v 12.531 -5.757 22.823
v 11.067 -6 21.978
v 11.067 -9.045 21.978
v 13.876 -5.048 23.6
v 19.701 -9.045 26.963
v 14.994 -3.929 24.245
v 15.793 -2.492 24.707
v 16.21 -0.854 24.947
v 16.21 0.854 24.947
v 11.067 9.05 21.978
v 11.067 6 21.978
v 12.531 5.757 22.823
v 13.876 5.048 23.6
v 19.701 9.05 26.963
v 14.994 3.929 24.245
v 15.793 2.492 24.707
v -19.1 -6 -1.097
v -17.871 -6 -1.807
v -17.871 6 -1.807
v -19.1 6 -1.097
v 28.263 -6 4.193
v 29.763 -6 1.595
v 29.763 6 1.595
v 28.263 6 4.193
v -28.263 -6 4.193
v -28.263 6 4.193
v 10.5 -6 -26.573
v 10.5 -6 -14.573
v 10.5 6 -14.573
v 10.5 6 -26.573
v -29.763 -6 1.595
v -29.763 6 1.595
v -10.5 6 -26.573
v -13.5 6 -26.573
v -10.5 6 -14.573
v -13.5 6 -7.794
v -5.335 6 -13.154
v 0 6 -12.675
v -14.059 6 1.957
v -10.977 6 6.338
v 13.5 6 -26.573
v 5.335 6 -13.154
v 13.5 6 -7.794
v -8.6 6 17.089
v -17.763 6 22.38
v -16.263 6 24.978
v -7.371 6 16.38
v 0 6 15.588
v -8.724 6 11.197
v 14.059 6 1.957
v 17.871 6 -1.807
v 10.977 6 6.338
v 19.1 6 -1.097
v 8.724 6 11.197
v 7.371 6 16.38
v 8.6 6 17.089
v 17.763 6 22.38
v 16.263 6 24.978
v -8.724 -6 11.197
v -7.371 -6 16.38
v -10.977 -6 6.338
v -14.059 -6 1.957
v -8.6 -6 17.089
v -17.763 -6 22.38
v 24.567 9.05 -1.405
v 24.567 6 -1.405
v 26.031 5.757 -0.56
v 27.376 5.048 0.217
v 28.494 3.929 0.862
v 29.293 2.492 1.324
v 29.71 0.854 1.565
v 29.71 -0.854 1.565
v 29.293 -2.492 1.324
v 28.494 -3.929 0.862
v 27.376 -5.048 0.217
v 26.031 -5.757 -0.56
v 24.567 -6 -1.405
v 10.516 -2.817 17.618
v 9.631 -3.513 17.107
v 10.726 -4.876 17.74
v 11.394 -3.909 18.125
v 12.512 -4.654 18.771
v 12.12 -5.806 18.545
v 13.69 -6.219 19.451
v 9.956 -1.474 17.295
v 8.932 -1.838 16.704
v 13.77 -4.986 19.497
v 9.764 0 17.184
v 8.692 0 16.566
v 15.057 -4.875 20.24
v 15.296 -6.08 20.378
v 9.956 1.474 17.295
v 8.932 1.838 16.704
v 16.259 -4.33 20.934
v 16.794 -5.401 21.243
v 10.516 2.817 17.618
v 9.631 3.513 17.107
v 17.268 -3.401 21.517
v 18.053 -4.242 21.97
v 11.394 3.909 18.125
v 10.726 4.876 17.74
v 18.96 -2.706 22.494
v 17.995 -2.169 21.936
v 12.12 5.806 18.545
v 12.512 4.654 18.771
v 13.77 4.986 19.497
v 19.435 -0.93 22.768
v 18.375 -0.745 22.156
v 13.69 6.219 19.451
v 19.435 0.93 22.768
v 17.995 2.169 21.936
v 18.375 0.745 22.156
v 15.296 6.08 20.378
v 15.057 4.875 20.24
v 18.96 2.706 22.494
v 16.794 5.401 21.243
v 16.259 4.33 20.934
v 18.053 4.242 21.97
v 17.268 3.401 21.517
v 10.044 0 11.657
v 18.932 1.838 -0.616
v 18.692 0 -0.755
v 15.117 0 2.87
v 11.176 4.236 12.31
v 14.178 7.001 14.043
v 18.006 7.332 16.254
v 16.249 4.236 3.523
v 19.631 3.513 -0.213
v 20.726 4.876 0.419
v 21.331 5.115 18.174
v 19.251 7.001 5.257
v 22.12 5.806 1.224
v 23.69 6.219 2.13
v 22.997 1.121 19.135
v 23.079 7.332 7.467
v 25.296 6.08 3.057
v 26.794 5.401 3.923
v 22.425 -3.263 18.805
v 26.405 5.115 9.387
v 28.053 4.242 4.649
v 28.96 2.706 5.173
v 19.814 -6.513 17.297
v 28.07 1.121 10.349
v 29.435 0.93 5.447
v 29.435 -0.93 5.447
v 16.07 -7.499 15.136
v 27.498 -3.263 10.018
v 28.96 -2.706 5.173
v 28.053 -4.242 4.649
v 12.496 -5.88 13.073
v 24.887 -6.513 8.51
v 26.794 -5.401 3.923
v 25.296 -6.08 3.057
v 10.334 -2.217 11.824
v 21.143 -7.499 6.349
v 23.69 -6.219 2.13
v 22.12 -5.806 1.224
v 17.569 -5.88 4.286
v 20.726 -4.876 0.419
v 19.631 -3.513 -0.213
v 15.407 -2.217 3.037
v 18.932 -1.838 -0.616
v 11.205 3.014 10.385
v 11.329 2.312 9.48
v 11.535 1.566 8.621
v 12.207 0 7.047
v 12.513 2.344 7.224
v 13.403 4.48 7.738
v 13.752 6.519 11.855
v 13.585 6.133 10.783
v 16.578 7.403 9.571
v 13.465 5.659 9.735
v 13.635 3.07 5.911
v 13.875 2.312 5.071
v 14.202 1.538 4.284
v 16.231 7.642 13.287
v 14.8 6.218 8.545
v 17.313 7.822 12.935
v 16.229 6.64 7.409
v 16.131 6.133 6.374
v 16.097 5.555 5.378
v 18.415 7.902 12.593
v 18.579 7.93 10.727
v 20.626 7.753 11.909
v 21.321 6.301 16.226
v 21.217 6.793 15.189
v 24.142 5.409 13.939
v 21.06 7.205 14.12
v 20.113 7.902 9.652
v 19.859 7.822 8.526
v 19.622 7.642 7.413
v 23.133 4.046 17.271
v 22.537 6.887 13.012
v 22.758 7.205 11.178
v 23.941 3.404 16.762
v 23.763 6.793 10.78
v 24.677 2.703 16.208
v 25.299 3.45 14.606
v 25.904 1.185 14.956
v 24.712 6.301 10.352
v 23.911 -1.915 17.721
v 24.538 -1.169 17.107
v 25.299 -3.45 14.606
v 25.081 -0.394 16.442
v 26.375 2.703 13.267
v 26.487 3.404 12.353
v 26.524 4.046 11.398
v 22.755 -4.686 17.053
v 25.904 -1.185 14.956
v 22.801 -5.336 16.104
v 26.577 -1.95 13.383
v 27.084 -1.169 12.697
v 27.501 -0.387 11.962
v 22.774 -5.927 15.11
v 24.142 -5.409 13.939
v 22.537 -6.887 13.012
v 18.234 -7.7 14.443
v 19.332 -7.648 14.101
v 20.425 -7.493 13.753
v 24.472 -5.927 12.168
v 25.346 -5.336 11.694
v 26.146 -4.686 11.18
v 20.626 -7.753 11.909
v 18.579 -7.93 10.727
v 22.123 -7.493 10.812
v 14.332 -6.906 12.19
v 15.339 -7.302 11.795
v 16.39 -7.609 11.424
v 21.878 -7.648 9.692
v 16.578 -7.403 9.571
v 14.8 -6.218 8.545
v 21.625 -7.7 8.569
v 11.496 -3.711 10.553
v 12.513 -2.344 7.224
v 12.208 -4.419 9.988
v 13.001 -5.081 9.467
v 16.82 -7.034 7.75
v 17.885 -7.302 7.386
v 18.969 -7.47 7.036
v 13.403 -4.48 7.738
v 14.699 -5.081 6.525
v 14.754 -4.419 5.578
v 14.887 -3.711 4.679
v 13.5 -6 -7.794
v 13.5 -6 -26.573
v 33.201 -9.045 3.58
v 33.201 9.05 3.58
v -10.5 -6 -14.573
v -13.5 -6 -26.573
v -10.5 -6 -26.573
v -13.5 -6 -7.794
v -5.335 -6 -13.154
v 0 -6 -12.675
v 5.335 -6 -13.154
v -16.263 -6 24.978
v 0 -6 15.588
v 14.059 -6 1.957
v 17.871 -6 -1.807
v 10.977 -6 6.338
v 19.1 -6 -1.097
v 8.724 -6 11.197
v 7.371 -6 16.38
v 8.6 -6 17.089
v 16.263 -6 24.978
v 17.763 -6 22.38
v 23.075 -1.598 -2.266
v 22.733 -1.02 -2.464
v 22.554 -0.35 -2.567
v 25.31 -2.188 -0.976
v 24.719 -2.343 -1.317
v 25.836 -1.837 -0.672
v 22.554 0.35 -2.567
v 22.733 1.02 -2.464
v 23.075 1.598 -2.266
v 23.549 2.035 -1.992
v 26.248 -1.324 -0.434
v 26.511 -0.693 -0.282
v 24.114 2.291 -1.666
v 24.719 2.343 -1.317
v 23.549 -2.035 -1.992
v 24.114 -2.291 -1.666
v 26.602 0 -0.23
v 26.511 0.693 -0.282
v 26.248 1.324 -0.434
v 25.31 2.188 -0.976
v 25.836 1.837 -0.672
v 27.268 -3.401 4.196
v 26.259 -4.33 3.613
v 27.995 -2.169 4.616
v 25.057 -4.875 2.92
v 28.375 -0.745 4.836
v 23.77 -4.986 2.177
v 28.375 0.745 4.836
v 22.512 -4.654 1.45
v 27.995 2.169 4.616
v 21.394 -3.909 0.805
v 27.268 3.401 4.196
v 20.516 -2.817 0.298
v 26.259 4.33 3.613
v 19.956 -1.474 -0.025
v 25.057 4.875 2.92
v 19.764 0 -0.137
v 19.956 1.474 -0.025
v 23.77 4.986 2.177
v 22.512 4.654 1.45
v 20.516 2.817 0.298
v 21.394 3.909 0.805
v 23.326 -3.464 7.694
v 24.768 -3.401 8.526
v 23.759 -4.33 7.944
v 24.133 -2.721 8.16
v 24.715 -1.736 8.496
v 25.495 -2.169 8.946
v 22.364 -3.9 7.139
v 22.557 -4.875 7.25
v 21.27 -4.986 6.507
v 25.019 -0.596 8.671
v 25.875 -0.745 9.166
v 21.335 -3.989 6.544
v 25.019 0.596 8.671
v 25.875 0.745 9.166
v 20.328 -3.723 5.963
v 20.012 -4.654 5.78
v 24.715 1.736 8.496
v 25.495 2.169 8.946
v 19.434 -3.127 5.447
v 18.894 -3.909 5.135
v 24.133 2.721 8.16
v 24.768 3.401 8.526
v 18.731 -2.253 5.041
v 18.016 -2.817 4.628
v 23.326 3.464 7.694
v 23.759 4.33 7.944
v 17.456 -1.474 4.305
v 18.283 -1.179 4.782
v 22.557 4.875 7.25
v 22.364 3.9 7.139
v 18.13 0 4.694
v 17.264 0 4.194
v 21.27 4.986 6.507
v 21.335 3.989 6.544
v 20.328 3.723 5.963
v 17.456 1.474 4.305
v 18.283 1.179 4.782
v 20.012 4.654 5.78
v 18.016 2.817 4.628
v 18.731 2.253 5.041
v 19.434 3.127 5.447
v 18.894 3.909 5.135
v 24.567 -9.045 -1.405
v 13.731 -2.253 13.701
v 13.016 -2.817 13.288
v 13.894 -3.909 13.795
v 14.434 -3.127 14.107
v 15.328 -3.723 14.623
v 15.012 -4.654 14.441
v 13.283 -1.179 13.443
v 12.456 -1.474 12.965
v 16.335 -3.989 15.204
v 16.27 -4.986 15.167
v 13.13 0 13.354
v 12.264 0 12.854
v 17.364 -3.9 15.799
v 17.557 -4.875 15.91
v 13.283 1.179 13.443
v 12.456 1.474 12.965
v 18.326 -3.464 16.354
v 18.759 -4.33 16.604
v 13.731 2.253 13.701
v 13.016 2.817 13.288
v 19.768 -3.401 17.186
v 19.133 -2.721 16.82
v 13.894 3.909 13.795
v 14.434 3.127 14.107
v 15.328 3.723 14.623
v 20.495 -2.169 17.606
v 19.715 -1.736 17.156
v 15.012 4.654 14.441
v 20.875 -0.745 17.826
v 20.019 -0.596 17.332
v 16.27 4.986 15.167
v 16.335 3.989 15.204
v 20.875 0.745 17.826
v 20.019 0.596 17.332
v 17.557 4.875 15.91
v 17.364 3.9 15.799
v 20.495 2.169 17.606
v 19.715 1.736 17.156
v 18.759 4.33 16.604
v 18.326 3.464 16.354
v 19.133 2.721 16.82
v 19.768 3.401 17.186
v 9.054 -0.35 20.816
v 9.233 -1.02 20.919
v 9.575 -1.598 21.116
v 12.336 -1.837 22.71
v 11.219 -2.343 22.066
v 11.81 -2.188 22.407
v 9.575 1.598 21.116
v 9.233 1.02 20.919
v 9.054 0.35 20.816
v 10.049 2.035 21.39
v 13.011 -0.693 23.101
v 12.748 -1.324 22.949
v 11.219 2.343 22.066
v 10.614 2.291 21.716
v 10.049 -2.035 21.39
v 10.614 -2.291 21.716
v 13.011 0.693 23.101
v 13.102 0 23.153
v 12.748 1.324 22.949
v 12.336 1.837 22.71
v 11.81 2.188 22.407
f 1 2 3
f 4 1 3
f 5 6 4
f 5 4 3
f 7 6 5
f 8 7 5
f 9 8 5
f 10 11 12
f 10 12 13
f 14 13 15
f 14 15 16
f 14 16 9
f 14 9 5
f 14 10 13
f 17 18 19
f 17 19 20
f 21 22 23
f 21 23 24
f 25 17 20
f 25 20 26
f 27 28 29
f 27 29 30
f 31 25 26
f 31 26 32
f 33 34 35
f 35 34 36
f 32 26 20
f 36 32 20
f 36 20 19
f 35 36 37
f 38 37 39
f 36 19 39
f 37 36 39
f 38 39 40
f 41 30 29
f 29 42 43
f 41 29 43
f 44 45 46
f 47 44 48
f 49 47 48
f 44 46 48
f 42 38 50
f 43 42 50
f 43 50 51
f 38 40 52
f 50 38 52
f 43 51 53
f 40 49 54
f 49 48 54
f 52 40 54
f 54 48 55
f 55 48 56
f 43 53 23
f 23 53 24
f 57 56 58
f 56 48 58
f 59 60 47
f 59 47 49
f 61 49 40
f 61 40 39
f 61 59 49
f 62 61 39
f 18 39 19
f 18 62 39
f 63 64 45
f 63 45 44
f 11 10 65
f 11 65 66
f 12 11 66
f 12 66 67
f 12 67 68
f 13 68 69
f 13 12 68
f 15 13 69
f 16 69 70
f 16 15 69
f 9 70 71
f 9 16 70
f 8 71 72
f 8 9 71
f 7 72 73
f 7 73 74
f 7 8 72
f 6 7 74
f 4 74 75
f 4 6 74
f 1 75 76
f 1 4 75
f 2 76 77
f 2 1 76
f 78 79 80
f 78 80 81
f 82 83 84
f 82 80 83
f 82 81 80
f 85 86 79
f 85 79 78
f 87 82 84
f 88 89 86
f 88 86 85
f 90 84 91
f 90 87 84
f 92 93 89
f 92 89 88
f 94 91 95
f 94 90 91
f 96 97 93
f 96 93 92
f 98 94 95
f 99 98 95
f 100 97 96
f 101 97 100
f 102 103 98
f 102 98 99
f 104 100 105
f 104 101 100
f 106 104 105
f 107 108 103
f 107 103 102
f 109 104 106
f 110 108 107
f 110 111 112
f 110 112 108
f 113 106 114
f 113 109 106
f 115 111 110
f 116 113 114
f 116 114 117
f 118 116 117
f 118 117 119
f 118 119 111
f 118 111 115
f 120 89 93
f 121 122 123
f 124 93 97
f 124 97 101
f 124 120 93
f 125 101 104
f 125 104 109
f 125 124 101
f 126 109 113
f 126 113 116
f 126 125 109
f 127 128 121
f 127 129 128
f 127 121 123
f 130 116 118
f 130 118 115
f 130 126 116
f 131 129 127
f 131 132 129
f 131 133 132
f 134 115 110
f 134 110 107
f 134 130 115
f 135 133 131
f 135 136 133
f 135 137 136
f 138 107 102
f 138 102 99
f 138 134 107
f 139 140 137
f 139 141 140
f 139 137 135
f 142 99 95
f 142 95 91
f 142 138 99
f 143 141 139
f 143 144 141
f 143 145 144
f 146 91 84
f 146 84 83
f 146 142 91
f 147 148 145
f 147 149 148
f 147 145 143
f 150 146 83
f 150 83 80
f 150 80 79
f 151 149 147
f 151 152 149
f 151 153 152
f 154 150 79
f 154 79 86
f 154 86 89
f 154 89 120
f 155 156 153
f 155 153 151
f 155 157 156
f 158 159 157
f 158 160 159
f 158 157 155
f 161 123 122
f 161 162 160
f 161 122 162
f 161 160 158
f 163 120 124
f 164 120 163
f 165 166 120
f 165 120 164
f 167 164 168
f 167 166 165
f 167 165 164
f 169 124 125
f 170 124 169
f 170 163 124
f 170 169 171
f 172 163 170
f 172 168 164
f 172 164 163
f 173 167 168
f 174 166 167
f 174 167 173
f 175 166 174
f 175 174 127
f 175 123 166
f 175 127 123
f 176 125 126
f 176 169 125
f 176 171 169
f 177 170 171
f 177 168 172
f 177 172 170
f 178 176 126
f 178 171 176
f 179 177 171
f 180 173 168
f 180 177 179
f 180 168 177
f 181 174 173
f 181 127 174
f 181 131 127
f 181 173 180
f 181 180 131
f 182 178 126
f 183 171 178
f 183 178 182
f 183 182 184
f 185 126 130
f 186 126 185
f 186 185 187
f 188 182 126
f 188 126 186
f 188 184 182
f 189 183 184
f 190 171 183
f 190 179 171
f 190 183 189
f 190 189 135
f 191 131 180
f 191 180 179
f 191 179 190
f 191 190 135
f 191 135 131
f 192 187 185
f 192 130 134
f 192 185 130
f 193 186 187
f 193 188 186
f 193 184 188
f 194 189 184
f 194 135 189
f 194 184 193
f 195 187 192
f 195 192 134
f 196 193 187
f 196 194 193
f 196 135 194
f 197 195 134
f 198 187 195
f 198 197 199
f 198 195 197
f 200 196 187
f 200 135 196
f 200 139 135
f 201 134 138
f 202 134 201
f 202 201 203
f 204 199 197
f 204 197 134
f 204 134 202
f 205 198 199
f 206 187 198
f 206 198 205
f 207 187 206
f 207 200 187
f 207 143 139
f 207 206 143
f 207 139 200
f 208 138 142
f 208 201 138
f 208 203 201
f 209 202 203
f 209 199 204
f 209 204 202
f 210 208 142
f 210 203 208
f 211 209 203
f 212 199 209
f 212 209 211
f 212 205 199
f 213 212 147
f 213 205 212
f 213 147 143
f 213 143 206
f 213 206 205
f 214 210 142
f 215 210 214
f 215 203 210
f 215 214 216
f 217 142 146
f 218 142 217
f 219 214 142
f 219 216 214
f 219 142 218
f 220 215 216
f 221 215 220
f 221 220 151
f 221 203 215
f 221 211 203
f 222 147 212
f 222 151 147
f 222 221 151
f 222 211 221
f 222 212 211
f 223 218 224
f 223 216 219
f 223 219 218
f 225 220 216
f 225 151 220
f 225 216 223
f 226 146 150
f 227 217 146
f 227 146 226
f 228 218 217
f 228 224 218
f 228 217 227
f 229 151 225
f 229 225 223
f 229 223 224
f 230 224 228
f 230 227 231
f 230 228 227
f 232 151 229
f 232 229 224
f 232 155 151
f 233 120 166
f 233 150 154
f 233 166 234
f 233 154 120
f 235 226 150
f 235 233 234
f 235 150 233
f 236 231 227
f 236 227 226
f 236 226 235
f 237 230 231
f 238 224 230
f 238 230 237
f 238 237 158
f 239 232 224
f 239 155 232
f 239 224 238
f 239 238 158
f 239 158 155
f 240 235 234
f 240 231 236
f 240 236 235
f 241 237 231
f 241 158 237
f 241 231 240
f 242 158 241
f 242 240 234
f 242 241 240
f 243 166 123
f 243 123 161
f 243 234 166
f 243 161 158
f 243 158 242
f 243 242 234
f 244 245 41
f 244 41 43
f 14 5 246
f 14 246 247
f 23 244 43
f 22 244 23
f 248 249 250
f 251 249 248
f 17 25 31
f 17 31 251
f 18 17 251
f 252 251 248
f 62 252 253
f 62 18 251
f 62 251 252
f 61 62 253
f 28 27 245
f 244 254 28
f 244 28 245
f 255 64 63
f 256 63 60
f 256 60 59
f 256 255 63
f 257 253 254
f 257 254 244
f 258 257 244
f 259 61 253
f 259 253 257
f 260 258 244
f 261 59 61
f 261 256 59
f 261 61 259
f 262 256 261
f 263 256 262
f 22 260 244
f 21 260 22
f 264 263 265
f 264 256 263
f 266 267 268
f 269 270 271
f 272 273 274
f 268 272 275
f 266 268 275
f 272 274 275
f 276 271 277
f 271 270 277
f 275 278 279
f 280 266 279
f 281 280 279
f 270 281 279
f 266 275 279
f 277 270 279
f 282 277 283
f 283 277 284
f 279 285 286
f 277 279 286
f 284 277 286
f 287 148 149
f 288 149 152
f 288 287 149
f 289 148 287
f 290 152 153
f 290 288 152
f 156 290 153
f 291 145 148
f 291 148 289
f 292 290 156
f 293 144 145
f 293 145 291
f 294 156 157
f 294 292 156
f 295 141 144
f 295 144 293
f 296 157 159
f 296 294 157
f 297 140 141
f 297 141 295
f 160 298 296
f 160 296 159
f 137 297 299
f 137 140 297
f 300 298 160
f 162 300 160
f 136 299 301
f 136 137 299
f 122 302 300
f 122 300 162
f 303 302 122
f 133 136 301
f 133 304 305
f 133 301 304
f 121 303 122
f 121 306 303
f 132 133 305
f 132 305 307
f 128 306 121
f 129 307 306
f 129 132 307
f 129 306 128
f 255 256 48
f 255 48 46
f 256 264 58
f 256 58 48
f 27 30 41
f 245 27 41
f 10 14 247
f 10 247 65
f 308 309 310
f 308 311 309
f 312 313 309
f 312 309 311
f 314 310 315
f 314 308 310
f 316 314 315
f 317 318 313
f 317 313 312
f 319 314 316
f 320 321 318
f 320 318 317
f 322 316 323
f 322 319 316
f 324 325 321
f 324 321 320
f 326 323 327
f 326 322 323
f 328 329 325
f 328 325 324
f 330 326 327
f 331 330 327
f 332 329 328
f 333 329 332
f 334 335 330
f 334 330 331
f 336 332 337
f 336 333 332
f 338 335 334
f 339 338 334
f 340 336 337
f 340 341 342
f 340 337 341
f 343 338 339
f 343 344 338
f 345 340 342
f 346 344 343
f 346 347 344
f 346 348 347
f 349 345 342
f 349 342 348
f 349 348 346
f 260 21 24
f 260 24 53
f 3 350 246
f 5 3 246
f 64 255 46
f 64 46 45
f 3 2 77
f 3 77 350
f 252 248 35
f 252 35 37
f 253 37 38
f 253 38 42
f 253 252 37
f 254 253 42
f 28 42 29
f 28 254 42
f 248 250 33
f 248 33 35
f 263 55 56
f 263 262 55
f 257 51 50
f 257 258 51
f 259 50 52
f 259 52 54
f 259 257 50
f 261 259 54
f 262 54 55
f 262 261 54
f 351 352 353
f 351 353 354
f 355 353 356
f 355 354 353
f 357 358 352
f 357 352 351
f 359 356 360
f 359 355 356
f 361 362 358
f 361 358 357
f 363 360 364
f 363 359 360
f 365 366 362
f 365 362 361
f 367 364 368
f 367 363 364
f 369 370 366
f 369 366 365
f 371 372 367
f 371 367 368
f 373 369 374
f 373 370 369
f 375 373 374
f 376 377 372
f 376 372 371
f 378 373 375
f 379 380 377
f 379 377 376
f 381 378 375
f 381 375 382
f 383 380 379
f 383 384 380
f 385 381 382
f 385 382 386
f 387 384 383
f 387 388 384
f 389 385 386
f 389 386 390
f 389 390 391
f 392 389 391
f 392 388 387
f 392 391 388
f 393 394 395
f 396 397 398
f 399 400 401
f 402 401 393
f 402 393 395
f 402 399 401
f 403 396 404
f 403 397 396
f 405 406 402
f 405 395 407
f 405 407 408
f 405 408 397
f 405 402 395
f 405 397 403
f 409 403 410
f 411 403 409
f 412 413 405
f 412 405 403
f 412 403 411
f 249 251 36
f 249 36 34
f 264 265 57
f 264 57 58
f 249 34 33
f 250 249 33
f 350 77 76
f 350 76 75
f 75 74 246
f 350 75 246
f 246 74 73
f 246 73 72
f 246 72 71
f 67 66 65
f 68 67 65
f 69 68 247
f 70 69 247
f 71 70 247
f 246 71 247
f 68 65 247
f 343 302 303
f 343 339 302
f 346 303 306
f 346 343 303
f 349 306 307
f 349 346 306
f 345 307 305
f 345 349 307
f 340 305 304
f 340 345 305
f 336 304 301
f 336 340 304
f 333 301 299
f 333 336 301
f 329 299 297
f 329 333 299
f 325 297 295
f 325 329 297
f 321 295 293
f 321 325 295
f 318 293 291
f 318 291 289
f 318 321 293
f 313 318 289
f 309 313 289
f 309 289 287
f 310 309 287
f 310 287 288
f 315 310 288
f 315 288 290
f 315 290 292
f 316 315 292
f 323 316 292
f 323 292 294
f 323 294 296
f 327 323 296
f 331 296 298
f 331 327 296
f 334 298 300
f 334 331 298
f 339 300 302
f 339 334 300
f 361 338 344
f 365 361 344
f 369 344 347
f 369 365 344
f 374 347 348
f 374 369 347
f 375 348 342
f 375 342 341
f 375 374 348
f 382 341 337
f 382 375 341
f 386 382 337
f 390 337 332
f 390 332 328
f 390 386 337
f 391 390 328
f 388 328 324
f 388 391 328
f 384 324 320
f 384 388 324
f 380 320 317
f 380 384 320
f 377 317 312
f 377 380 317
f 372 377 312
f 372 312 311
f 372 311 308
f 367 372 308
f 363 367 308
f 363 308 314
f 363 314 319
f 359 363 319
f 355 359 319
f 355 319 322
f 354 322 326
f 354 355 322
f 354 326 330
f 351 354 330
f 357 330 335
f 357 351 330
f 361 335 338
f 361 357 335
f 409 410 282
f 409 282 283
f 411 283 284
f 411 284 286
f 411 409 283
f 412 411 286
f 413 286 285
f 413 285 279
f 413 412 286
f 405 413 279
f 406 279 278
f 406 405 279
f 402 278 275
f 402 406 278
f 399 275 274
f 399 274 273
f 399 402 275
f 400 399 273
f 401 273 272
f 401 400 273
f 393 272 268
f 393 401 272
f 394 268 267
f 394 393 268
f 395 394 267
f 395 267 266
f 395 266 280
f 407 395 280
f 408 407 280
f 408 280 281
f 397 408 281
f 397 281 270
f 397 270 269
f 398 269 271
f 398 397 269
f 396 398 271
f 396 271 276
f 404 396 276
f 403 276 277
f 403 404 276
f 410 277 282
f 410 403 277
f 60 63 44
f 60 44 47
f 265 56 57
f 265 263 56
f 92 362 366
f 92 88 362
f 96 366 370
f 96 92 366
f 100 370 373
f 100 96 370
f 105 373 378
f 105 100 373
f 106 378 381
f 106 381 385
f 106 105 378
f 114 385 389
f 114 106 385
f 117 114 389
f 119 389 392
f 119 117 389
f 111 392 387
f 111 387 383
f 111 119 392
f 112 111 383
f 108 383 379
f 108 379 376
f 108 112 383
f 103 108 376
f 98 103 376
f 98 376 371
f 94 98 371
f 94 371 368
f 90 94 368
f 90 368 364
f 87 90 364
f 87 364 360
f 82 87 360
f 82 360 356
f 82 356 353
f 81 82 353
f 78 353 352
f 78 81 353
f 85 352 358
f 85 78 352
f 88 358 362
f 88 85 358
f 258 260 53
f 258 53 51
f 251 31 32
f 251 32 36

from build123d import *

# Parameters (mm, degrees)
F3_DEPTH = 6
F5_DEPTH = 27
F4_R     = 2.35


# Not quite as in the source:
# - a feature of the source that left no trace in its solid (it failed there, or was rolled back) is left out


with BuildPart() as f2:
    # F1 (on Front) → F2 (revolve)
    with BuildSketch(Plane.XZ):
        with BuildLine():
            Line((18.6924170284, -0.7549333807), (19.7635302092, -0.1365258974))
            Line((19.7635302092, -0.1365258974), (17.2635302092, 4.1936011215))
            Line((17.2635302092, 4.1936011215), (18.129555613, 4.6936011215))
            Line((18.129555613, 4.6936011215), (13.129555613, 13.3538551594))
            Line((13.129555613, 13.3538551594), (12.2635302092, 12.8538551594))
            Line((12.2635302092, 12.8538551594), (9.7635302092, 17.1839821783))
            Line((9.7635302092, 17.1839821783), (8.6924170284, 16.565574695))
            ThreePointArc((8.6924170284, 16.565574695), (12.2065523427, 7.0474562809), (18.6924170284, -0.7549333807))
        make_face()
    revolve(axis=Axis((19.0936572281, 0, 11.0237281405), (0.5, 0, -0.8660254038)))


with BuildPart() as f3:
    # F0 (on Front) → F3 (new body, symmetric)
    with BuildSketch(Plane.XZ):
        with BuildLine():
            Line((8.5998433468, 17.0894775242), (17.7628466203, 22.3797399308))
            Line((17.7628466203, 22.3797399308), (16.2628466203, 24.9778161421))
            Line((16.2628466203, 24.9778161421), (0, 15.5884572681))
            Line((0, 15.5884572681), (-16.2628466203, 24.9778161421))
            Line((-16.2628466203, 24.9778161421), (-17.7628466203, 22.3797399308))
            Line((-17.7628466203, 22.3797399308), (-8.5998433468, 17.0894775242))
            Line((-8.5998433468, 17.0894775242), (-7.3705417748, 16.3797399308))
            ThreePointArc((-7.3705417748, 16.3797399308), (-10.9772507707, 6.3377186874), (-17.8705417748, -1.8067935487))
            Line((-17.8705417748, -1.8067935487), (-19.0998433468, -1.0970559552))
            Line((-19.0998433468, -1.0970559552), (-28.2628466203, 4.1932064513))
            Line((-28.2628466203, 4.1932064513), (-29.7628466203, 1.5951302399))
            Line((-29.7628466203, 1.5951302399), (-13.5, -7.7942286341))
            Line((-13.5, -7.7942286341), (-13.5, -26.5729463821))
            Line((-13.5, -26.5729463821), (-10.5, -26.5729463821))
            Line((-10.5, -26.5729463821), (-10.5, -15.992421569))
            Line((-10.5, -15.992421569), (-10.5, -14.5729463821))
            ThreePointArc((-10.5, -14.5729463821), (0, -12.6754373748), (10.5, -14.5729463821))
            Line((10.5, -14.5729463821), (10.5, -15.992421569))
            Line((10.5, -15.992421569), (10.5, -26.5729463821))
            Line((10.5, -26.5729463821), (13.5, -26.5729463821))
            Line((13.5, -26.5729463821), (13.5, -7.7942286341))
            Line((13.5, -7.7942286341), (29.7628466203, 1.5951302399))
            Line((29.7628466203, 1.5951302399), (28.2628466203, 4.1932064513))
            Line((28.2628466203, 4.1932064513), (19.0998433468, -1.0970559552))
            Line((19.0998433468, -1.0970559552), (17.8705417748, -1.8067935487))
            ThreePointArc((17.8705417748, -1.8067935487), (10.9772507707, 6.3377186874), (7.3705417748, 16.3797399308))
            Line((7.3705417748, 16.3797399308), (8.5998433468, 17.0894775242))
        make_face()
    extrude(amount=F3_DEPTH, both=True)


with BuildPart() as f5:
    # F4 (on face) → F5 (new body)
    with BuildSketch(Plane(origin=(-6.75, 0, 11.6913429511), x_dir=(0.8660254038, 0, 0.5), z_dir=(-0.5, 0, 0.8660254038))):
        with BuildLine():
            ThreePointArc((20.5729463821, 6), (26.5729463821, 0), (20.5729463821, -6))
            Line((20.5729463821, -6), (20.5729463821, -9.0451398864))
            Line((20.5729463821, -9.0451398864), (30.5433310568, -9.0451398864))
            Line((30.5433310568, -9.0451398864), (30.5433310568, 9.0504763648))
            Line((30.5433310568, 9.0504763648), (20.5729463821, 9.0504763648))
            Line((20.5729463821, 9.0504763648), (20.5729463821, 6))
        make_face()
    extrude(amount=-F5_DEPTH)


with BuildPart() as f5b:
    # F4 (on face) → F5, piece 2 (new body)
    with BuildSketch(Plane(origin=(-6.75, 0, 11.6913429511), x_dir=(0.8660254038, 0, 0.5), z_dir=(-0.5, 0, 0.8660254038))):
        with Locations((20.5729463821, 0)):
            Circle(F4_R)
    extrude(amount=-F5_DEPTH)


solid = Compound([f2.part, f3.part, f5.part, f5b.part])
